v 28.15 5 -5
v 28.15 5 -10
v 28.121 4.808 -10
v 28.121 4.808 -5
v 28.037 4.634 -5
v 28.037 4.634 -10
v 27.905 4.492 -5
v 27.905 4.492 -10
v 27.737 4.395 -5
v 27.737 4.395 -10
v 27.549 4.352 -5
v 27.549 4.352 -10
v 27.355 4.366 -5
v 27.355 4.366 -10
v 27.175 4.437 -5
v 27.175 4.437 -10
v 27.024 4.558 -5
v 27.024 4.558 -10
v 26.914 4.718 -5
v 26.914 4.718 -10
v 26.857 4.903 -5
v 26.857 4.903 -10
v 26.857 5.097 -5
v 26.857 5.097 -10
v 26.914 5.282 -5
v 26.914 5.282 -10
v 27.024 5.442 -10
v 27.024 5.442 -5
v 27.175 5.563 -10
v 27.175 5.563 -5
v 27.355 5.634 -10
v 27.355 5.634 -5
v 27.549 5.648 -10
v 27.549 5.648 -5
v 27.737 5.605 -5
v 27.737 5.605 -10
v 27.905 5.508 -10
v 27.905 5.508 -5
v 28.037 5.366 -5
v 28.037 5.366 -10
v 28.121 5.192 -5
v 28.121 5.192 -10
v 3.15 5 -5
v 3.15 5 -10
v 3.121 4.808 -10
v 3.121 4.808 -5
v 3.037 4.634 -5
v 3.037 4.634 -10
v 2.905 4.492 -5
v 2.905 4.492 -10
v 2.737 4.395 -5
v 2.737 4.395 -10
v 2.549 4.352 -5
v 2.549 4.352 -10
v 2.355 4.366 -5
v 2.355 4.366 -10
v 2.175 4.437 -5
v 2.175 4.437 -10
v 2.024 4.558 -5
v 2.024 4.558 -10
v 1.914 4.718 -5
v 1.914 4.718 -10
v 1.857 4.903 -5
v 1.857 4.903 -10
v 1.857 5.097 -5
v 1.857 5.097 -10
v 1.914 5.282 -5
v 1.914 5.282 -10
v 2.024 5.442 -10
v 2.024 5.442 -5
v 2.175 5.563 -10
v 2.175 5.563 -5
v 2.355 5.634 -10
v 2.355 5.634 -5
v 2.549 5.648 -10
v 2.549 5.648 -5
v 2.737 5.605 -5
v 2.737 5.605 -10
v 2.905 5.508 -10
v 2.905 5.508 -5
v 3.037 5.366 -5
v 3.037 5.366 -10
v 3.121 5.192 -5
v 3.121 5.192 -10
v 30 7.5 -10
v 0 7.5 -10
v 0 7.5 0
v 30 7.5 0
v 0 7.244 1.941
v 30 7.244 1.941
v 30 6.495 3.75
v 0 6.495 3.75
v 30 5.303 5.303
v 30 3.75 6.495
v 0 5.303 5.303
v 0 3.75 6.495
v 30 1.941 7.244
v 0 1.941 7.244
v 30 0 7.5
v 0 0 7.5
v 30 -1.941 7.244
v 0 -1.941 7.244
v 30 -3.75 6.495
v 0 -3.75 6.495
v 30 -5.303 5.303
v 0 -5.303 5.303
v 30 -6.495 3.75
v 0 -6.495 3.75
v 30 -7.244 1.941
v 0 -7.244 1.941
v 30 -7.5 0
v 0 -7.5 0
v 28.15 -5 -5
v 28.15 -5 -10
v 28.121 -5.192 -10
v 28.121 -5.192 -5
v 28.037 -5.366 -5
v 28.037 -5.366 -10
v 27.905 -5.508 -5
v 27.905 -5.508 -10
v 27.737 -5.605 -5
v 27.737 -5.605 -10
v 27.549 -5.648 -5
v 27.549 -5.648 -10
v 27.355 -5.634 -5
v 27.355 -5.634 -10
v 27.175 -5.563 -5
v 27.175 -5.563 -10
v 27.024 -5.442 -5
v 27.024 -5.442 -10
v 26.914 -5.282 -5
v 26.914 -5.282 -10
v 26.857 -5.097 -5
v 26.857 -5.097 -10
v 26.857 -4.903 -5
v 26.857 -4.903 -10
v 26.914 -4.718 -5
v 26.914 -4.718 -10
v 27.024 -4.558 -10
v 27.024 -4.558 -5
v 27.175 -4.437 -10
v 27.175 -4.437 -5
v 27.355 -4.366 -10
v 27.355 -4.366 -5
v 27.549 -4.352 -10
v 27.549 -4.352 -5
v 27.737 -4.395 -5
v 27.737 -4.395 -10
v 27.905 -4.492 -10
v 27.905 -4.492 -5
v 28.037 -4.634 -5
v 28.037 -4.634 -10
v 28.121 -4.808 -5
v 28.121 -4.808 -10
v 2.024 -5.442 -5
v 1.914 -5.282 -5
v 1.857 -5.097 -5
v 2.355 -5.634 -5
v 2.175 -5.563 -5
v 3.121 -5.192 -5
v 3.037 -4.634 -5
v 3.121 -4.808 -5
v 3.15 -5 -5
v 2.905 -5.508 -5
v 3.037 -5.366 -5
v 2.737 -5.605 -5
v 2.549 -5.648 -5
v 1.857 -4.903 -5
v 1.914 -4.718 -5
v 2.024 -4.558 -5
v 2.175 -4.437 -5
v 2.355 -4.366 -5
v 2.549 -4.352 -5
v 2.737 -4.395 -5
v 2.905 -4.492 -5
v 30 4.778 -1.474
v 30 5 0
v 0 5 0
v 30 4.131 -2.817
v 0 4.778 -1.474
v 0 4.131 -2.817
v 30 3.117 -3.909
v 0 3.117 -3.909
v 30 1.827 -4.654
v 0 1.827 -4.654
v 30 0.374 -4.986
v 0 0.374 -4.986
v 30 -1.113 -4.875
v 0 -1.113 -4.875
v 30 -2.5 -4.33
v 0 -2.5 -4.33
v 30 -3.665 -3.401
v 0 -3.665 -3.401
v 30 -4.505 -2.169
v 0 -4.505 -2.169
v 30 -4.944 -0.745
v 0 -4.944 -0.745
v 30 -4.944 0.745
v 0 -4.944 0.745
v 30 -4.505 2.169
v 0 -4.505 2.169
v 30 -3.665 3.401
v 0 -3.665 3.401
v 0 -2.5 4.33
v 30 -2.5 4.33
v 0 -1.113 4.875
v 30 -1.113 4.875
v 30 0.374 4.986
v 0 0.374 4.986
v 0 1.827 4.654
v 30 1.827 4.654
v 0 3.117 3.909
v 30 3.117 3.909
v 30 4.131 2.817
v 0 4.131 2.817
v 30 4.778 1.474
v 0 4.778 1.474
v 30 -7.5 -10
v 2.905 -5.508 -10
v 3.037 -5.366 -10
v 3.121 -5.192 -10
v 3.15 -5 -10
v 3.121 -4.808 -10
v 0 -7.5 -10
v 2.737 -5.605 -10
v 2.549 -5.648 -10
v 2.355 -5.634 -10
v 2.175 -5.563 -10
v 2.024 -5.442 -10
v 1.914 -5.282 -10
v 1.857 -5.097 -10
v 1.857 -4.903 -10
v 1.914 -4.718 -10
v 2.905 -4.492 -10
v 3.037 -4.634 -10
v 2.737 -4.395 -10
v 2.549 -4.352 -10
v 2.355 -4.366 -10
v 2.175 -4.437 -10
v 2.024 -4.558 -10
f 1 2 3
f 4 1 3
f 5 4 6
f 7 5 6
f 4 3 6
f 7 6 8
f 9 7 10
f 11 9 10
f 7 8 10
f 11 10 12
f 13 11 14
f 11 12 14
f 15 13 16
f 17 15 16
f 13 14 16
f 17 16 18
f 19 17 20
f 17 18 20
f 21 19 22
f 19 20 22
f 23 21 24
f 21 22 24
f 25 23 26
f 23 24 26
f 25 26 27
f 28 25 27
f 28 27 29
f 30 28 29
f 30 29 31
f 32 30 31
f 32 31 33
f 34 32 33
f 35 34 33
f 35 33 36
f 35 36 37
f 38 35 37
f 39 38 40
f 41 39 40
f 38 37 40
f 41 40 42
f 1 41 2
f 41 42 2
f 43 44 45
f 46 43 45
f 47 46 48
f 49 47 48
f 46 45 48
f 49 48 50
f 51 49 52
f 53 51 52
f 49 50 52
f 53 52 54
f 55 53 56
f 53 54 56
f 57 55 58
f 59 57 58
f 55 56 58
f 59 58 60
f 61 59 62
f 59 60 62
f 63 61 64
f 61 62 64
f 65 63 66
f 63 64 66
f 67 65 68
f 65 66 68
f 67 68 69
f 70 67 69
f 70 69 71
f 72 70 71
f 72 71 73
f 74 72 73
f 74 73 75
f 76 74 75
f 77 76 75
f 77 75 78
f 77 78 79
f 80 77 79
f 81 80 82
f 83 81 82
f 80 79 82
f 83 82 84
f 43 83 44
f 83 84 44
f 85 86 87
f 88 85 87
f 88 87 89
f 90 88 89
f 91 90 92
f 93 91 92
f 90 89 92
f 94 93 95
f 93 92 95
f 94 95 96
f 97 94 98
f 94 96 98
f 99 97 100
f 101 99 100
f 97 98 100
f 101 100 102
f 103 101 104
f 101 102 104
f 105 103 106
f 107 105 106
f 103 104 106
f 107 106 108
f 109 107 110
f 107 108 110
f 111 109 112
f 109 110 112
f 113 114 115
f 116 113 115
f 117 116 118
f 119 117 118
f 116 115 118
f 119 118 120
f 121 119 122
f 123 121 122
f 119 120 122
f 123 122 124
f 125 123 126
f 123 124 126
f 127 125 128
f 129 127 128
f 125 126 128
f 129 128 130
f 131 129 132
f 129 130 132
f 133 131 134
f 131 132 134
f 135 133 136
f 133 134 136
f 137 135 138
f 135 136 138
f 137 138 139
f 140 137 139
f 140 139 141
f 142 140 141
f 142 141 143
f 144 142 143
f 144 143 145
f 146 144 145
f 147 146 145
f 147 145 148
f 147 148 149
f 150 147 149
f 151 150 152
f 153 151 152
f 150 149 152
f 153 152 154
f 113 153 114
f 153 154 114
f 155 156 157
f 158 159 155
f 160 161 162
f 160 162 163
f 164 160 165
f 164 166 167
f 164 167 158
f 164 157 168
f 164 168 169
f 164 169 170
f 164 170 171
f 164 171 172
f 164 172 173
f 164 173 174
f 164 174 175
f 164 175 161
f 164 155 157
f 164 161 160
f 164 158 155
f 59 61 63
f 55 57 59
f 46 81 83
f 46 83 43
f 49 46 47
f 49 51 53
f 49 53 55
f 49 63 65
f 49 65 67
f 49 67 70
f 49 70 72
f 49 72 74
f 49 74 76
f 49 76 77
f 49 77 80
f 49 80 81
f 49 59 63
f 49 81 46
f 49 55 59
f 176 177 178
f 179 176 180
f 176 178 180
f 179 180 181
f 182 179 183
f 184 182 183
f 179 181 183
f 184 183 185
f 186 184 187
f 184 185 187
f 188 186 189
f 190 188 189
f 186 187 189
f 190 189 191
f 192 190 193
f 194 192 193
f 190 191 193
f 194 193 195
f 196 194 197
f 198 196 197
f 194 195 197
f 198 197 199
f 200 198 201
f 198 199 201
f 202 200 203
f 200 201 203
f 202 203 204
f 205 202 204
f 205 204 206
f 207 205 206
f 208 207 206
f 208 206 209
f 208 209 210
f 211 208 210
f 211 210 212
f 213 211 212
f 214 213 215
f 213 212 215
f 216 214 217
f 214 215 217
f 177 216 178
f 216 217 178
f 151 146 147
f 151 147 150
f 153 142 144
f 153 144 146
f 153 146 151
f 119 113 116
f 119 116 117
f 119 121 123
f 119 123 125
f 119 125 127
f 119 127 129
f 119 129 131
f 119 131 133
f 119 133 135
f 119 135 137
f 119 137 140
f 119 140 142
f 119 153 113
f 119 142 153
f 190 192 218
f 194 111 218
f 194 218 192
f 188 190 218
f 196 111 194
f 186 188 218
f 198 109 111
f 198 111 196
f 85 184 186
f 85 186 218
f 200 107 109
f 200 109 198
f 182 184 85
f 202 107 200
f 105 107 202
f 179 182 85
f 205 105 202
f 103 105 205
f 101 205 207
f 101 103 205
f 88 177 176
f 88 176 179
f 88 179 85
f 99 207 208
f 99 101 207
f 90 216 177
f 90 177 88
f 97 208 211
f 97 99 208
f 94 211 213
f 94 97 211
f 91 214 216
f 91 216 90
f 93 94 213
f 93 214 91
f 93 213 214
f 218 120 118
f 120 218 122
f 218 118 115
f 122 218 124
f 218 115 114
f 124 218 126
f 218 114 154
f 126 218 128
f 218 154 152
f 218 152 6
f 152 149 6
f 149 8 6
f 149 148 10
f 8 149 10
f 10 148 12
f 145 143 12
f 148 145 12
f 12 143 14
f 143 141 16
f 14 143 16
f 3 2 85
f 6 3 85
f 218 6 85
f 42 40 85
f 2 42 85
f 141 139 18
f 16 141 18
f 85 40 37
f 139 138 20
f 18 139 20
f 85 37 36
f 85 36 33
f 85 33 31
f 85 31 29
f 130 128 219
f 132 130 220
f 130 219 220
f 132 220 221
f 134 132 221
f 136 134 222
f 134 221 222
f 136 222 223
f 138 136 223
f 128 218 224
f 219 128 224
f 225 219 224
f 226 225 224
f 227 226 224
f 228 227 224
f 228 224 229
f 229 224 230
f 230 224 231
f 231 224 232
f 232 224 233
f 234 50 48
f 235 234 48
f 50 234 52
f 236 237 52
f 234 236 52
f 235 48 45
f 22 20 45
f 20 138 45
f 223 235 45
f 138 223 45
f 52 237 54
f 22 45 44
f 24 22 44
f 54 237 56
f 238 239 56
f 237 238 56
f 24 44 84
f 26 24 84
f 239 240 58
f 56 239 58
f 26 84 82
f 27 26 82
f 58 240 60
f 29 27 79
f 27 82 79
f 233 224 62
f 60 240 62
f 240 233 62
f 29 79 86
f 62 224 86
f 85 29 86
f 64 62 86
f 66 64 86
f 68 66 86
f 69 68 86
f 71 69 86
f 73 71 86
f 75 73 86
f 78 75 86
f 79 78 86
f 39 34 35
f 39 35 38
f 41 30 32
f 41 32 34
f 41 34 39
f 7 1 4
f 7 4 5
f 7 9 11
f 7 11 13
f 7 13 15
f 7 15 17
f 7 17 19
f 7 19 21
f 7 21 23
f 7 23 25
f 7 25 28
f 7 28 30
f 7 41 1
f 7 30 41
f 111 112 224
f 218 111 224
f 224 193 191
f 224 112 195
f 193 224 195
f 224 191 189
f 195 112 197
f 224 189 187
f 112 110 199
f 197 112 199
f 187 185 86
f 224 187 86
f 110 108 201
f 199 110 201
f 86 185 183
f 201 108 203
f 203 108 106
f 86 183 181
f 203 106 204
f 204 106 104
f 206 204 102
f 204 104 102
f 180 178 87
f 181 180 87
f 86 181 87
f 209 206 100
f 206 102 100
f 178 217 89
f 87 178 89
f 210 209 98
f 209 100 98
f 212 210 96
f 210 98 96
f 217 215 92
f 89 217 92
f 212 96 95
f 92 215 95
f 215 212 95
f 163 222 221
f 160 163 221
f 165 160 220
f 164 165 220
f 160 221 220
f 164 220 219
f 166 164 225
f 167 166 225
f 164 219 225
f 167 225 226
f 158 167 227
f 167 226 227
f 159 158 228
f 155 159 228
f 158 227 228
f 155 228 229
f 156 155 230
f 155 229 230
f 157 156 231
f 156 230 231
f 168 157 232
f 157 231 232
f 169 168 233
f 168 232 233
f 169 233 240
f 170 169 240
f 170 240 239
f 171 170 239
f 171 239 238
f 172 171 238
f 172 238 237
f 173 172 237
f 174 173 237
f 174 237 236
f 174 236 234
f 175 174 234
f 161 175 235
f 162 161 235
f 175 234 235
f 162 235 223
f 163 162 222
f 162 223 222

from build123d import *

# Parameters (mm, degrees)
F1_DEPTH = 30
F2_R     = 0.65
F3_DEPTH = 5


with BuildPart() as f1:
    # F0 (on Right) → F1 (new body)
    with BuildSketch(Plane.YZ):
        with BuildLine():
            ThreePointArc((-5, 0), (0, 5), (5, 0))
            Line((5, 0), (7.5, 0))
            ThreePointArc((7.5, 0), (0, 7.5), (-7.5, 0))
            Line((-7.5, 0), (-5, 0))
        make_face()
        with BuildLine():
            Line((7.5, 0), (5, 0))
            ThreePointArc((5, 0), (0, -5), (-5, 0))
            Line((-5, 0), (-7.5, 0))
            Line((-7.5, 0), (-7.5, -10))
            Line((-7.5, -10), (7.5, -10))
            Line((7.5, -10), (7.5, 0))
        make_face()
    extrude(amount=F1_DEPTH)

    # F2 (on face) → F3 (cut)
    with BuildSketch(Plane(origin=(0, 0, -10), x_dir=(1, 0, 0), z_dir=(0, 0, -1))):
        with Locations((27.5, 5)):
            Circle(F2_R)
        with Locations((27.5, -5)):
            Circle(F2_R)
        with Locations((2.5, 5)):
            Circle(F2_R)
        with Locations((2.5, -5)):
            Circle(F2_R)
    extrude(amount=-F3_DEPTH, mode=Mode.SUBTRACT)


solid = f1.part
